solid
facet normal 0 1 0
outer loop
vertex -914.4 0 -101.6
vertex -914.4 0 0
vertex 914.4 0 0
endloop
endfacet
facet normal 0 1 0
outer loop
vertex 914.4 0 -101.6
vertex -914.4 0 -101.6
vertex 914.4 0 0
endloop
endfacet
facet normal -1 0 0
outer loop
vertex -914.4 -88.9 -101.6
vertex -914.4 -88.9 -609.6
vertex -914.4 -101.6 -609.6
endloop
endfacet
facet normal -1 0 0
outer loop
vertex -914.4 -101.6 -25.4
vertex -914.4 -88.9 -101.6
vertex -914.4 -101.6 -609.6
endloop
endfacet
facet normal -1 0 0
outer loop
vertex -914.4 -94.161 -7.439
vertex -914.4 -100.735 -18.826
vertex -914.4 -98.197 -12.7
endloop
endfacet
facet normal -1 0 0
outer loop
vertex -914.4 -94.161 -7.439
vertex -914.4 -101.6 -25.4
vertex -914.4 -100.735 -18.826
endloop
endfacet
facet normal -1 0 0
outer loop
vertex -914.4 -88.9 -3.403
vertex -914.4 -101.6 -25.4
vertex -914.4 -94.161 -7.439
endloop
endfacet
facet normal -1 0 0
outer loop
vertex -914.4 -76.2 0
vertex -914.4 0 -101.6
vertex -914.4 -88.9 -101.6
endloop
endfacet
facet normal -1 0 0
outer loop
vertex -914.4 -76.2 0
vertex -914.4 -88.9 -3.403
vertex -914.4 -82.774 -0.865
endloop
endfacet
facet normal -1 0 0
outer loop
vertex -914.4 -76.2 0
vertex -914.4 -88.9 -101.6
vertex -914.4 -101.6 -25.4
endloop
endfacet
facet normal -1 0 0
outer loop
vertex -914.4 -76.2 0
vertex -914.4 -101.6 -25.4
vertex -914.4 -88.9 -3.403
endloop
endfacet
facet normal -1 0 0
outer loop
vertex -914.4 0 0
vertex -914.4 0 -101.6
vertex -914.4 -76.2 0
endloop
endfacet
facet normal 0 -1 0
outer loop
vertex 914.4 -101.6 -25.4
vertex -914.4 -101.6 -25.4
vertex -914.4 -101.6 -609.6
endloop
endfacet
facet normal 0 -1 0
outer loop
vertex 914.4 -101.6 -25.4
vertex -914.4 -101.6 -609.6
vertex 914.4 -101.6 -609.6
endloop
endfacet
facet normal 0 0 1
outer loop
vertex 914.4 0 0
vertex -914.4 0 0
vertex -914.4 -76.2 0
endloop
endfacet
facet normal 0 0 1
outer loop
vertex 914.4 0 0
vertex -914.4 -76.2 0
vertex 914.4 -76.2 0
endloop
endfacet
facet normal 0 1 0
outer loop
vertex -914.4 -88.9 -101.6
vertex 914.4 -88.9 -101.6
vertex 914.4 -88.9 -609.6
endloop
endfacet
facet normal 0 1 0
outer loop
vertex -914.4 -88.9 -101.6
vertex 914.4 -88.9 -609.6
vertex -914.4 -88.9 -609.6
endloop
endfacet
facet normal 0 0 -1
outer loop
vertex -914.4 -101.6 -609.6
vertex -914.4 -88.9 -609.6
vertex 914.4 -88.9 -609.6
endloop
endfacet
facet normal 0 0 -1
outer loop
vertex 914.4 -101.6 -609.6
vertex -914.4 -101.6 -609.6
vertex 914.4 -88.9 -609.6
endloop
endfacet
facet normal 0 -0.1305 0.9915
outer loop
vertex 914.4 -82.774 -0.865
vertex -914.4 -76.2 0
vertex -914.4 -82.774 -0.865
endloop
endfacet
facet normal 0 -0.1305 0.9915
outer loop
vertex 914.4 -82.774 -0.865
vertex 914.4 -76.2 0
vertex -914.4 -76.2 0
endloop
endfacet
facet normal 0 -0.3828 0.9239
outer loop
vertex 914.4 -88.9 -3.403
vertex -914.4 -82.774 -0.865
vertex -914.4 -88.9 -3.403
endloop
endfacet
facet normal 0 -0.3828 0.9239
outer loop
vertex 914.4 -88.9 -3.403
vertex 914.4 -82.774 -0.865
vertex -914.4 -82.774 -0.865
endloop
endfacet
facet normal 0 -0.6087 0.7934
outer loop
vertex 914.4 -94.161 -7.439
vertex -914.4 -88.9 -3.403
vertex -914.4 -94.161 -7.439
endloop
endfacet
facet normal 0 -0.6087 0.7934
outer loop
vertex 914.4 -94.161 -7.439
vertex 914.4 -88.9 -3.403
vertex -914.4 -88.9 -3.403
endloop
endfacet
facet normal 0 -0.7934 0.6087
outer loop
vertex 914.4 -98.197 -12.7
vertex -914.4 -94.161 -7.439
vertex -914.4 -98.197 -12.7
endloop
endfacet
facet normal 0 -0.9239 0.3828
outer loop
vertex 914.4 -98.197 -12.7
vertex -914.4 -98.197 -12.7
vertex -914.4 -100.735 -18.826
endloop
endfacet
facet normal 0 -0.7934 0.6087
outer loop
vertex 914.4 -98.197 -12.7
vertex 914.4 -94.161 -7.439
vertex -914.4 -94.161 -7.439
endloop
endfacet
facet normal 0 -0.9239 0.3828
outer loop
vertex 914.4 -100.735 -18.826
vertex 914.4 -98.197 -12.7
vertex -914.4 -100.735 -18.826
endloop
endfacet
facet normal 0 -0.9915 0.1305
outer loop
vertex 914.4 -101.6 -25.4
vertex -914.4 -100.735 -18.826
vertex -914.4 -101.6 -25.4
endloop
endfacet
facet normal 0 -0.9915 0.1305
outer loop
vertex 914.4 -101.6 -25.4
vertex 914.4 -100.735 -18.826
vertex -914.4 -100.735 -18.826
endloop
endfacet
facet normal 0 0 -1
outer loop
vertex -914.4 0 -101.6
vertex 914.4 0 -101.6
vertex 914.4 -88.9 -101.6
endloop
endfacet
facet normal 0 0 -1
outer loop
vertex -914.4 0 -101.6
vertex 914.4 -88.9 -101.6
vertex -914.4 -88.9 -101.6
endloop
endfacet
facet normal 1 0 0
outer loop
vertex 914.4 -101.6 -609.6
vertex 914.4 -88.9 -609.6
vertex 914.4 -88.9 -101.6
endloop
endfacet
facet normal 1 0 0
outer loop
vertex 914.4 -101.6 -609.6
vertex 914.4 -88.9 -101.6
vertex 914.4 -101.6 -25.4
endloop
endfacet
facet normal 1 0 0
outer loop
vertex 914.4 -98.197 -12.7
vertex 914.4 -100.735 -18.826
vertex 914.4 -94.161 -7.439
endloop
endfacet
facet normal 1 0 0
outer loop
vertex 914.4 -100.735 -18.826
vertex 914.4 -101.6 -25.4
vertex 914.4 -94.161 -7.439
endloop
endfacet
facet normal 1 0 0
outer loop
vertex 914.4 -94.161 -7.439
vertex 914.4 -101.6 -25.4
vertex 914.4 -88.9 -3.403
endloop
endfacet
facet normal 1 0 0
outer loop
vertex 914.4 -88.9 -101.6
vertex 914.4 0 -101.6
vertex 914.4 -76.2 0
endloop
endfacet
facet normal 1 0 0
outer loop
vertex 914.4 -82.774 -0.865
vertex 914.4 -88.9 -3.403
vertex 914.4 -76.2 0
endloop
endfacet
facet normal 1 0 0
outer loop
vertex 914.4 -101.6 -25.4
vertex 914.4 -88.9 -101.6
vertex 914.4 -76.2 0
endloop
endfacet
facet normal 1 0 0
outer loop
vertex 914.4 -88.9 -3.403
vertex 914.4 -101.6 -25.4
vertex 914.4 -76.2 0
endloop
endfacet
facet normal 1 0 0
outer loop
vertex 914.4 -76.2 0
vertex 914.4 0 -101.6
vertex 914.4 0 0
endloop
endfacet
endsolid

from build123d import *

# Parameters (mm, degrees)
F0_W     = 1828.8
F0_H     = 609.6
F1_DEPTH = 101.6
F2_W     = 1828.8
F2_H     = 508
F3_DEPTH = 88.9
F4_R     = 25.4


with BuildPart() as f1:
    # F0 (on Front) → F1 (new body)
    with BuildSketch(Plane.XZ):
        with Locations((0, -304.8)):
            Rectangle(F0_W, F0_H)
    extrude(amount=F1_DEPTH)

    # F2 (on face) → F3 (cut)
    with BuildSketch(Plane(origin=(0, 0, 0), x_dir=(-1, 0, 0), z_dir=(0, 1, 0))):
        with Locations((0, -355.6)):
            Rectangle(F2_W, F2_H)
    extrude(amount=-F3_DEPTH, mode=Mode.SUBTRACT)

    # F4
    f4_edges = [f1.edges().sort_by_distance(p)[0] for p in [
        (0, -101.6, 0),
    ]]
    fillet(f4_edges, radius=F4_R)


solid = f1.part
